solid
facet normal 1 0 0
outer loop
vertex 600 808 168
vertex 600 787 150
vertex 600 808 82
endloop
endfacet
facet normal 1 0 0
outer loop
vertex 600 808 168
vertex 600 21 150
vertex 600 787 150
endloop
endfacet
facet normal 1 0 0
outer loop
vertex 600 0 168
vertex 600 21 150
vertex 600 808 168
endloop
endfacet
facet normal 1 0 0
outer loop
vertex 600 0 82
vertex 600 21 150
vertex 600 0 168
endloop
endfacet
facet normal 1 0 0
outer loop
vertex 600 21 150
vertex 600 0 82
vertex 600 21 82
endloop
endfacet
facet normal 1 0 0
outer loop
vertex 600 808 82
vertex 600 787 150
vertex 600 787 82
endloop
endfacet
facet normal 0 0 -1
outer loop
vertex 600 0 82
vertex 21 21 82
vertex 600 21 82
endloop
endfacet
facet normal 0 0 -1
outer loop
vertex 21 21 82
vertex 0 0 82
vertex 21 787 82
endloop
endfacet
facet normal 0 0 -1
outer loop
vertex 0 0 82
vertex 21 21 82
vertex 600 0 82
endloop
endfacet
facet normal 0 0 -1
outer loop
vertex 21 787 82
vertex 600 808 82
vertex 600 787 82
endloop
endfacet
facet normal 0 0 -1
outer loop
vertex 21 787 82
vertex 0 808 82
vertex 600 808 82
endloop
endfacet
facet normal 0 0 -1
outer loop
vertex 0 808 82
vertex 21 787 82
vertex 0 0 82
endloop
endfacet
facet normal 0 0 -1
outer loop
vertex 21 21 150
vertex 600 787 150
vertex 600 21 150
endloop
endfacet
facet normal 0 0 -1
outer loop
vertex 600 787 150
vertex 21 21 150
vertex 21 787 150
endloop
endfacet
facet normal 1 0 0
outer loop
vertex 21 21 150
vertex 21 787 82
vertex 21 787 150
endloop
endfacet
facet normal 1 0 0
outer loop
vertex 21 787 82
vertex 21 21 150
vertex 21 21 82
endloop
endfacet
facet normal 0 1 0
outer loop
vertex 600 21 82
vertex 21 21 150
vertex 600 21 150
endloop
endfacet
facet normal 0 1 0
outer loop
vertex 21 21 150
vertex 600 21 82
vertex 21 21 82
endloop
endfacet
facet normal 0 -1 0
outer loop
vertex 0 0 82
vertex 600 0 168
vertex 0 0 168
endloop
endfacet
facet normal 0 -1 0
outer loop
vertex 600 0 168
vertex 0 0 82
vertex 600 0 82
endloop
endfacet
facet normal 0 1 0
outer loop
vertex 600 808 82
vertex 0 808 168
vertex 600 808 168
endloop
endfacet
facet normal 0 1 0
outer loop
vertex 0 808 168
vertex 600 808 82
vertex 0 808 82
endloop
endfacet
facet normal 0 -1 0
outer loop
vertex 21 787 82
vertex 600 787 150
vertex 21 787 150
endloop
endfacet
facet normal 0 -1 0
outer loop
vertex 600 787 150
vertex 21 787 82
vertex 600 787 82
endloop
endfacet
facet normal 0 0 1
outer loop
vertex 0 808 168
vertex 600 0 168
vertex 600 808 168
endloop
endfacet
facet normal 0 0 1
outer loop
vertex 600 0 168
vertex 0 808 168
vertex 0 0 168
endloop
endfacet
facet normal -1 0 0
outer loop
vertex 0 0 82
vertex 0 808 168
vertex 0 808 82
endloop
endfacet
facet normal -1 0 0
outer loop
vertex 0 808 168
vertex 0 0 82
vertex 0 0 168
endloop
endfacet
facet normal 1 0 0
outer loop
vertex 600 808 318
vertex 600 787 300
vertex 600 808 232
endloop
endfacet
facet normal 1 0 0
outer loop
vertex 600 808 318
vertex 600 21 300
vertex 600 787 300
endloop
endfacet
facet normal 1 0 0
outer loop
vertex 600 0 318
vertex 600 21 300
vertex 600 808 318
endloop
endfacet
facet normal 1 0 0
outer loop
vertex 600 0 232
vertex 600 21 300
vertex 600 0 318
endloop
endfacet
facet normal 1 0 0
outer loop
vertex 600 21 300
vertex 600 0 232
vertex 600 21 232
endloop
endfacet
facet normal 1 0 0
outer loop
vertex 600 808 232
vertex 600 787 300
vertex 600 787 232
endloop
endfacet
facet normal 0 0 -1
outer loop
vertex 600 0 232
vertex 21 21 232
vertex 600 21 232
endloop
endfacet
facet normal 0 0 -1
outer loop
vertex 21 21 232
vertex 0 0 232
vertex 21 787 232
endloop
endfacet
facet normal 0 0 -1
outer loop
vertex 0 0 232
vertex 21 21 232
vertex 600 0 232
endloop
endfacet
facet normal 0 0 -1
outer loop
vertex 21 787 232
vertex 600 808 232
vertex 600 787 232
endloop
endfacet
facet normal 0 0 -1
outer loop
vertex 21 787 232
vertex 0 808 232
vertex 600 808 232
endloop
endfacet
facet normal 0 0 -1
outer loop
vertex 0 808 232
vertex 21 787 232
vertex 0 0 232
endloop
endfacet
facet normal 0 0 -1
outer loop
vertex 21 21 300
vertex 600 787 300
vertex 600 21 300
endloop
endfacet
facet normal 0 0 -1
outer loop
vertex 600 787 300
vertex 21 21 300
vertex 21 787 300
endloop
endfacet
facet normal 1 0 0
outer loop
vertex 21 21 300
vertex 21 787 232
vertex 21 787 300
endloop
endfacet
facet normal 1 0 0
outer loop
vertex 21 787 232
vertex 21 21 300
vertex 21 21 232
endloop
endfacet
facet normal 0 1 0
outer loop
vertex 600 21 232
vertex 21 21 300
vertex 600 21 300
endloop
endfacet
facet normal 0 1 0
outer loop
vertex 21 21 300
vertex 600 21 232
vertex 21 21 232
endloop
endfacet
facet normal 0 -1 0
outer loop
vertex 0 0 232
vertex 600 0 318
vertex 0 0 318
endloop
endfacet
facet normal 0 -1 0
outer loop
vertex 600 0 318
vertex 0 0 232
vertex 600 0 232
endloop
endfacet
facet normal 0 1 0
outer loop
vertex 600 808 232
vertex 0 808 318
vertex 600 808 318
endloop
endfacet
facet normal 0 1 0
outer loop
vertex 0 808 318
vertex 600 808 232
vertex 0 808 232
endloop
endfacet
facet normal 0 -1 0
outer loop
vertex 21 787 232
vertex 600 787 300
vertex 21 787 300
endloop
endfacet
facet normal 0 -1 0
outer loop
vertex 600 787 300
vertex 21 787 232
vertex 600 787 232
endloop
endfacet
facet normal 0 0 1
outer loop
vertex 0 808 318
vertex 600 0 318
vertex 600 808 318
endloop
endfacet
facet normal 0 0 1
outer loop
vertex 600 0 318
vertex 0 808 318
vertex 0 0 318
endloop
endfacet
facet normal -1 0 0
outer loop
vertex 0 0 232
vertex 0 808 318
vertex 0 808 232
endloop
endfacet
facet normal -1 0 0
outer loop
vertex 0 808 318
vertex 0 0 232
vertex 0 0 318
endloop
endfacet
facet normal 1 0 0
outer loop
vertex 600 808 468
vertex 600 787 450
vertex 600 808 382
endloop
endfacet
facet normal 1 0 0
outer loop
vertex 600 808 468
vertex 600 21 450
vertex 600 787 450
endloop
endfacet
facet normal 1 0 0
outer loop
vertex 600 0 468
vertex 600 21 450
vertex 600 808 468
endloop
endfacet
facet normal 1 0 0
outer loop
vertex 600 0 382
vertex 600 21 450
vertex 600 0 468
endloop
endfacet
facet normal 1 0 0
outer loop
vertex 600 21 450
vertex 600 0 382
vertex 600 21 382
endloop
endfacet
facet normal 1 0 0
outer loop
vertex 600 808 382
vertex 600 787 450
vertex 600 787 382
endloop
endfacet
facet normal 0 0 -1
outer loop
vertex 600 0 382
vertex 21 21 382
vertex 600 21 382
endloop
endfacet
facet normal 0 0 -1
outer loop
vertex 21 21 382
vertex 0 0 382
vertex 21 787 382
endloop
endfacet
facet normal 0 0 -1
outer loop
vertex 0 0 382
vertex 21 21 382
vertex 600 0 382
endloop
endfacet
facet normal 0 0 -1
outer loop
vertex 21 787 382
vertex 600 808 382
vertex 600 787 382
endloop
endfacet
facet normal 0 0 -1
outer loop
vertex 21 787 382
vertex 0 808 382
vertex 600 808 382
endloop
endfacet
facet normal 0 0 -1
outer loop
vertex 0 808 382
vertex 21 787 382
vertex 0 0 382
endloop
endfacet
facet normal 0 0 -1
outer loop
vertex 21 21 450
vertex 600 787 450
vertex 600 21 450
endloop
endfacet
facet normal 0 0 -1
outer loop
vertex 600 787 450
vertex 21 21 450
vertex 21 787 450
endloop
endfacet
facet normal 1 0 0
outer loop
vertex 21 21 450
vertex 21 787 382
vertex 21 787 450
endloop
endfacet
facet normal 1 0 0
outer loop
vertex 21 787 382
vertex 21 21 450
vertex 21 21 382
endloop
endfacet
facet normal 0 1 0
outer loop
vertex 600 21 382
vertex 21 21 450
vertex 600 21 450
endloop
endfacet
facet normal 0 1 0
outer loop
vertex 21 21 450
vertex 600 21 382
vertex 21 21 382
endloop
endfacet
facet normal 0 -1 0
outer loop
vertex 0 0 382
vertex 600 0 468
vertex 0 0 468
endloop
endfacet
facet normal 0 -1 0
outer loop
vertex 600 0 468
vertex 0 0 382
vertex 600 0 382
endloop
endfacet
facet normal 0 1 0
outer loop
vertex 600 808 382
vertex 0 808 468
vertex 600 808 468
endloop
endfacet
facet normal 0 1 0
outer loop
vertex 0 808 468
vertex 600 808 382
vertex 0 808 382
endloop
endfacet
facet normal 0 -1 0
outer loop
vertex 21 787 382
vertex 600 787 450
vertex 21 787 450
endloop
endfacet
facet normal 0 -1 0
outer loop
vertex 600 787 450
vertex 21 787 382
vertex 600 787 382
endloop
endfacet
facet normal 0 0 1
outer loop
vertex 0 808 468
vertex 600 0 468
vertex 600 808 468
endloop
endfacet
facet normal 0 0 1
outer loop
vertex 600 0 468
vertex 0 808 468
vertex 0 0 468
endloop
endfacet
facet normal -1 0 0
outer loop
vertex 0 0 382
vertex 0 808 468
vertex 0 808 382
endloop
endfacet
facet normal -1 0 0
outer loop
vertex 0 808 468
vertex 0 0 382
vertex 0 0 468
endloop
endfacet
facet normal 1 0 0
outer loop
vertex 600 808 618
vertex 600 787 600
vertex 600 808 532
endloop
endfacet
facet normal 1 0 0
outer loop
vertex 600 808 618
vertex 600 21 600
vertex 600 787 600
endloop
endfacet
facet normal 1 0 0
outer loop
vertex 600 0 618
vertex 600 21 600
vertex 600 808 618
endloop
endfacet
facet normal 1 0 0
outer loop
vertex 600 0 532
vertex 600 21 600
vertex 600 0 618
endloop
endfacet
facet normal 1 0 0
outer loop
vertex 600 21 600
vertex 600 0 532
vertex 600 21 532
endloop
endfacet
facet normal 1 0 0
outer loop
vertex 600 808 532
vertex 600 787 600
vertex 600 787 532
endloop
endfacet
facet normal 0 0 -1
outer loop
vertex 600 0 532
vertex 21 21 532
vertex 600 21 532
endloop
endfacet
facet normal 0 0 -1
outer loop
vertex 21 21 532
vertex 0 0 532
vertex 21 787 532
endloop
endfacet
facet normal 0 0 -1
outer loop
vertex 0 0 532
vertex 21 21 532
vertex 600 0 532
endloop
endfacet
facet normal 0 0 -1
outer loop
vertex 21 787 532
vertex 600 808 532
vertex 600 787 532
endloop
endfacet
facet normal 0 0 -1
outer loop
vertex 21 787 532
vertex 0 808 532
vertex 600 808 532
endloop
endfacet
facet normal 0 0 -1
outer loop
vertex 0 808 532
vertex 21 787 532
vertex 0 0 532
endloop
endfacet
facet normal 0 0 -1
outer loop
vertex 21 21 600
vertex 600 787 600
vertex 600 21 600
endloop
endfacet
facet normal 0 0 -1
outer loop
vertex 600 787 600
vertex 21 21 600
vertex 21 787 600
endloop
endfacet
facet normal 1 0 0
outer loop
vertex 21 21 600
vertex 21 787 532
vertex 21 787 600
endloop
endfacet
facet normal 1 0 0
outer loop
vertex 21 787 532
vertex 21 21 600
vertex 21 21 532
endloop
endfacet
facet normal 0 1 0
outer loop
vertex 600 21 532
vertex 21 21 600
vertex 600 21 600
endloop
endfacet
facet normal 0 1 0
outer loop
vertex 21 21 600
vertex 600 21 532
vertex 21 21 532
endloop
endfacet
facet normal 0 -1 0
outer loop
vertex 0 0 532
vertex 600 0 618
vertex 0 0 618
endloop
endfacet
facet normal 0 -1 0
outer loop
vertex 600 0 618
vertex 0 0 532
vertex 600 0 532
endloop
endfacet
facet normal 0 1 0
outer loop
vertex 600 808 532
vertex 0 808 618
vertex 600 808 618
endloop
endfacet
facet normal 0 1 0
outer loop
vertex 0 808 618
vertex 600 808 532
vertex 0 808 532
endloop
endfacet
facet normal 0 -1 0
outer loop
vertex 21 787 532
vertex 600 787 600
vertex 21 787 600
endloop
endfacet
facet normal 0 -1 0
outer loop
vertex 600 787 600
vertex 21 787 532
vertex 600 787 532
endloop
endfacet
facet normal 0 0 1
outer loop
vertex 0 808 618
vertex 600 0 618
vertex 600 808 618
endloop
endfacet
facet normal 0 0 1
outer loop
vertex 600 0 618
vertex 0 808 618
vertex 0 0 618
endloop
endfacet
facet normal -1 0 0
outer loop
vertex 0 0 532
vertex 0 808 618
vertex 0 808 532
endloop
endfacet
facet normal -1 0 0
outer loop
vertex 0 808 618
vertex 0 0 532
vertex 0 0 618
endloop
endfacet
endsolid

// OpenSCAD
// file: lib/lcupboard.scad
// Landing cupboard

// left to right
function lc_length() = 0808;
// front to back
function lc_width() = 1039;
// base to ceiling
function lc_height() = 1537;

// Skirting dimensions
function lc_skirting_width() = 16;
function lc_skirting_height() = 145;

module lc_skirting_rear() {
	cube([lc_skirting_width(), lc_length(), lc_skirting_height()]);
}

module lc_skirting_side() {
	cube([lc_width(), lc_skirting_width(), lc_skirting_height()]);
}

module lc_wall_with_door() {
	door_length = 617;
	door_height = 1138;
	wall_with_door(lc_length(), lc_height(), door_length, door_height);
}

// Walls, guidance only 2D shapes
module lc_walls() {
	// base
	square([lc_width(), lc_length()]);
	// rear
	rotate(-90, [0, 1, 0])
		square([lc_height(), lc_length()]);
	// door
	translate([lc_width(), 0, 0])
		rotate(-90, [0, 1, 0])
		lc_wall_with_door();

	lc_skirting_rear();
	lc_skirting_side();
	translate([0, lc_length()-lc_skirting_width(), 0])
		lc_skirting_side();
}

module lc_shelf() {
	echo(str("shelf, cut to ", length, "mm"));
	batten_side_large();
	wd_batten_rear_large(length / 2);
	color(wd_colour())
		cube([wd_shelf_width(), length, wd_shelf_height()]);
}
// file: lib/wardrobe.scad
// Bedroom Wardrobe CAD

// Note: OpenSCAD doesn't support nested use/include.
// The only way I could get it to work is by including every dependency into
// the main CAD file. Sadly, I think this is quite limited. Needs more
// investigaiton.
// include <lib/batten.scad>;
// use <lib/batten.scad>;

// Wardrobe dimensions
function wd_length() = 1733; // Y
function wd_width() = 0819; // X
function wd_height() = 2398; // Z

// Wardrobe colour
function wd_colour() = "white";
function wd_rail_colour() = "silver";

// Skirting dimensions
function wd_skirting_width() = 16;
function wd_skirting_height() = 145;

// Shelf dimensions
// Cut length to size.
function wd_shelf_height() = 18;
function wd_shelf_width() = 500;

// Clothes rail dimensions
function wd_rail_radius() = 10;
function wd_rail_z() = -40;

module wd_skirting_rear() {
	cube([wd_skirting_width(), wd_length(), wd_skirting_height()]);
}

module wd_skirting_side() {
	cube([wd_width(), wd_skirting_width(), wd_skirting_height()]);
}

module wd_wall_with_door() {
	door_length = 1381;
	door_height = 2000;
	wall_with_door(wd_length(), wd_height(), door_length, door_height);
}

// Walls, guidance only 2D shapes
module wd_walls() {
	// base
	square([wd_width(), wd_length()]);
	// rear
	rotate(-90, [0, 1, 0])
		square([wd_height(), wd_length()]);
	// door
	translate([wd_width(), 0, 0])
		rotate(-90, [0, 1, 0])
		wd_wall_with_door();

	wd_skirting_rear();
	wd_skirting_side();
	translate([0, wd_length()-wd_skirting_width(), 0])
		wd_skirting_side();
}

module _crail_support(shelf_width, y) {
	h = 50;
	w = 20;
	l = 10;
	translate([shelf_width / 2 - w, y, 0 - h])
		color(wd_rail_colour())
		cube([w, l, h]);
}

// Clothes rail full length, underneath shelf_height, centred on shelf_width.
module wd_crail_full(shelf_width) {
	// rail ends screw into the battens
	rail_end_radius = 20;
	rail_end_height = 10;
	rail_end_y = [batten_large_width(),
		wd_length()-batten_large_width()-rail_end_height];

	// rail supports suspend from the shelf
	rail_supports_y = [433, 1299];

	// Height of the pole if it were standing up
	rail_height = wd_length() - batten_large_width() * 2;
	echo(str("clothes rail, cut ", rail_height, "mm"));

	// Positioned half way under shelf_width and suspended z mm
	rail_x = shelf_width / 2;

	// rail
	translate([rail_x, batten_large_width(), wd_rail_z()])
		rotate(-90, [1, 0, 0])
		color(wd_rail_colour())
		cylinder(rail_height, wd_rail_radius(), wd_rail_radius());
	
	// supports
	for (i = rail_supports_y) {
		_crail_support(shelf_width, i);
	}
	for (i = rail_end_y) {
		translate([rail_x, i, wd_rail_z()])
			rotate(-90, [1, 0, 0])
			color(wd_rail_colour())
			cylinder(rail_end_height, rail_end_radius,
				rail_end_radius);
	}
}

// Create a full sized shelf
module wd_shelf_full(rail=false) {
	shelf_batten(wd_length());
	if (rail) {
		wd_crail_full(wd_shelf_width());
	}
}

// Wardrobe divider wall
// Set cutout to true to cut out rail, batten, skirting holes
module wd_div_wall(height, cutout=false) {
	echo(str("divider wall, cut to ", height, "mm"));
	if (cutout) {
		difference() {
			color(wd_colour())
				cube([wd_shelf_width(), wd_shelf_height(), height]);
			// Cutout for rail
			// Note: When you build this, drill a nice hole
			c_rail_x = wd_shelf_width() / 2 - wd_rail_radius();
			c_rail_height = abs(wd_rail_z()) + wd_rail_radius();
			translate([c_rail_x, 0, height])
				mirror([0, 0, 1])
				cube([wd_rail_radius() * 2,
					wd_shelf_height(),
					c_rail_height]);
			// batten cutout
			translate([0, 0, height])
				mirror([0, 0, 1])
				cube([batten_large_width(),
					wd_shelf_height(),
					batten_large_length()]);
			// skirting
			cube([wd_skirting_width(),
				wd_shelf_height(),
				wd_skirting_height()]);
		}
	} else {
		cube([wd_shelf_width(), wd_shelf_height(), height]);
	}
}

function wd_shelf_left_length_default() = 
	wd_length() / 2 - wd_shelf_height() / 2;

module wd_shelf_left(length=wd_shelf_left_length_default()) {
	shelf_batten(length, rbatten=false);
}

module wd_shelf_right(length=wd_shelf_left_length_default()) {
	translate([0, wd_length(), 0])
		mirror([0, 1, 0])
			wd_shelf_left(length);
}
// file: lib/shelf.scad
// Generic shelf function

function shelf_default_thickness() = 18;
function shelf_default_width() = 500;
function shelf_default_color() = "white";

module shelf(l, w=shelf_default_width(), t=shelf_default_thickness()) {
	echo(str("shelf w ", w, "mm, cut to l ", l, "mm"));
	color(shelf_default_color())
		cube([w, l, t]);

}

module _batten_rear(l) {
	mirror([0, 0, 1])
		batten_y(l);
}

module shelf_batten(l, w=shelf_default_width(), t=shelf_default_thickness(),
		lbatten=true, rbatten=true) {
	shelf(l, w, t);
	_batten_rear(l);

	// side battens
	// The side battens are shorter because the rear batten spans the
	// length (y) of the wall.
	batten_side_width = w - batten_large_width();
	translate([batten_large_width(), 0, 0]) 
		mirror([0, 0, 1]) {
			if (lbatten) {
				batten_x(batten_side_width);
			}
			if (rbatten) {
				// right
				translate([0, l, 0])
					mirror([0, 1, 0])
						batten_x(batten_side_width);
			}
	}
}
// file: lib/batten.scad
// Batton CAD
function batten_colour() = "white";

// Batten dimensions
// Battens hold up shelves, cut height to size, and translate into place
// Notes: length and width of batton doesn't map directly to xyz
function batten_large_length() = 68;
function batten_large_width() = 21;

module batten_y(h) {
	w = batten_large_width();
	l = batten_large_length();
	echo(str("batten y ", l, "mm x ", w, "mm, cut to ", h, "mm"));
	color(batten_colour())
		cube([w, h, l]);
}

module batten_x(h) {
	w = batten_large_width();
	l = batten_large_length();
	echo(str("batten x ", l, "mm x ", w, "mm, cut to ", h, "mm"));
	color(batten_colour())
		cube([h, w, l]);
}
// file: lib/wall.scad
// Wall helpers

module wall_with_door(wall_length, wall_height, door_length, door_height) {
	border_length = (wall_length - door_length) / 2;
	difference() {
		// border
		square([wall_height, wall_length]);
		// opening
		translate([0, border_length, 0])
			square([door_height, door_length]);
	}
}
// main file
include <lib/wall.scad>
include <lib/batten.scad>
include <lib/shelf.scad>
include <lib/wardrobe.scad>
include <lib/lcupboard.scad>

% lc_walls();

for (i = [150, 300, 450, 600]) {
	translate([0, 0, i])
		shelf_batten(lc_length(), 600);
}
